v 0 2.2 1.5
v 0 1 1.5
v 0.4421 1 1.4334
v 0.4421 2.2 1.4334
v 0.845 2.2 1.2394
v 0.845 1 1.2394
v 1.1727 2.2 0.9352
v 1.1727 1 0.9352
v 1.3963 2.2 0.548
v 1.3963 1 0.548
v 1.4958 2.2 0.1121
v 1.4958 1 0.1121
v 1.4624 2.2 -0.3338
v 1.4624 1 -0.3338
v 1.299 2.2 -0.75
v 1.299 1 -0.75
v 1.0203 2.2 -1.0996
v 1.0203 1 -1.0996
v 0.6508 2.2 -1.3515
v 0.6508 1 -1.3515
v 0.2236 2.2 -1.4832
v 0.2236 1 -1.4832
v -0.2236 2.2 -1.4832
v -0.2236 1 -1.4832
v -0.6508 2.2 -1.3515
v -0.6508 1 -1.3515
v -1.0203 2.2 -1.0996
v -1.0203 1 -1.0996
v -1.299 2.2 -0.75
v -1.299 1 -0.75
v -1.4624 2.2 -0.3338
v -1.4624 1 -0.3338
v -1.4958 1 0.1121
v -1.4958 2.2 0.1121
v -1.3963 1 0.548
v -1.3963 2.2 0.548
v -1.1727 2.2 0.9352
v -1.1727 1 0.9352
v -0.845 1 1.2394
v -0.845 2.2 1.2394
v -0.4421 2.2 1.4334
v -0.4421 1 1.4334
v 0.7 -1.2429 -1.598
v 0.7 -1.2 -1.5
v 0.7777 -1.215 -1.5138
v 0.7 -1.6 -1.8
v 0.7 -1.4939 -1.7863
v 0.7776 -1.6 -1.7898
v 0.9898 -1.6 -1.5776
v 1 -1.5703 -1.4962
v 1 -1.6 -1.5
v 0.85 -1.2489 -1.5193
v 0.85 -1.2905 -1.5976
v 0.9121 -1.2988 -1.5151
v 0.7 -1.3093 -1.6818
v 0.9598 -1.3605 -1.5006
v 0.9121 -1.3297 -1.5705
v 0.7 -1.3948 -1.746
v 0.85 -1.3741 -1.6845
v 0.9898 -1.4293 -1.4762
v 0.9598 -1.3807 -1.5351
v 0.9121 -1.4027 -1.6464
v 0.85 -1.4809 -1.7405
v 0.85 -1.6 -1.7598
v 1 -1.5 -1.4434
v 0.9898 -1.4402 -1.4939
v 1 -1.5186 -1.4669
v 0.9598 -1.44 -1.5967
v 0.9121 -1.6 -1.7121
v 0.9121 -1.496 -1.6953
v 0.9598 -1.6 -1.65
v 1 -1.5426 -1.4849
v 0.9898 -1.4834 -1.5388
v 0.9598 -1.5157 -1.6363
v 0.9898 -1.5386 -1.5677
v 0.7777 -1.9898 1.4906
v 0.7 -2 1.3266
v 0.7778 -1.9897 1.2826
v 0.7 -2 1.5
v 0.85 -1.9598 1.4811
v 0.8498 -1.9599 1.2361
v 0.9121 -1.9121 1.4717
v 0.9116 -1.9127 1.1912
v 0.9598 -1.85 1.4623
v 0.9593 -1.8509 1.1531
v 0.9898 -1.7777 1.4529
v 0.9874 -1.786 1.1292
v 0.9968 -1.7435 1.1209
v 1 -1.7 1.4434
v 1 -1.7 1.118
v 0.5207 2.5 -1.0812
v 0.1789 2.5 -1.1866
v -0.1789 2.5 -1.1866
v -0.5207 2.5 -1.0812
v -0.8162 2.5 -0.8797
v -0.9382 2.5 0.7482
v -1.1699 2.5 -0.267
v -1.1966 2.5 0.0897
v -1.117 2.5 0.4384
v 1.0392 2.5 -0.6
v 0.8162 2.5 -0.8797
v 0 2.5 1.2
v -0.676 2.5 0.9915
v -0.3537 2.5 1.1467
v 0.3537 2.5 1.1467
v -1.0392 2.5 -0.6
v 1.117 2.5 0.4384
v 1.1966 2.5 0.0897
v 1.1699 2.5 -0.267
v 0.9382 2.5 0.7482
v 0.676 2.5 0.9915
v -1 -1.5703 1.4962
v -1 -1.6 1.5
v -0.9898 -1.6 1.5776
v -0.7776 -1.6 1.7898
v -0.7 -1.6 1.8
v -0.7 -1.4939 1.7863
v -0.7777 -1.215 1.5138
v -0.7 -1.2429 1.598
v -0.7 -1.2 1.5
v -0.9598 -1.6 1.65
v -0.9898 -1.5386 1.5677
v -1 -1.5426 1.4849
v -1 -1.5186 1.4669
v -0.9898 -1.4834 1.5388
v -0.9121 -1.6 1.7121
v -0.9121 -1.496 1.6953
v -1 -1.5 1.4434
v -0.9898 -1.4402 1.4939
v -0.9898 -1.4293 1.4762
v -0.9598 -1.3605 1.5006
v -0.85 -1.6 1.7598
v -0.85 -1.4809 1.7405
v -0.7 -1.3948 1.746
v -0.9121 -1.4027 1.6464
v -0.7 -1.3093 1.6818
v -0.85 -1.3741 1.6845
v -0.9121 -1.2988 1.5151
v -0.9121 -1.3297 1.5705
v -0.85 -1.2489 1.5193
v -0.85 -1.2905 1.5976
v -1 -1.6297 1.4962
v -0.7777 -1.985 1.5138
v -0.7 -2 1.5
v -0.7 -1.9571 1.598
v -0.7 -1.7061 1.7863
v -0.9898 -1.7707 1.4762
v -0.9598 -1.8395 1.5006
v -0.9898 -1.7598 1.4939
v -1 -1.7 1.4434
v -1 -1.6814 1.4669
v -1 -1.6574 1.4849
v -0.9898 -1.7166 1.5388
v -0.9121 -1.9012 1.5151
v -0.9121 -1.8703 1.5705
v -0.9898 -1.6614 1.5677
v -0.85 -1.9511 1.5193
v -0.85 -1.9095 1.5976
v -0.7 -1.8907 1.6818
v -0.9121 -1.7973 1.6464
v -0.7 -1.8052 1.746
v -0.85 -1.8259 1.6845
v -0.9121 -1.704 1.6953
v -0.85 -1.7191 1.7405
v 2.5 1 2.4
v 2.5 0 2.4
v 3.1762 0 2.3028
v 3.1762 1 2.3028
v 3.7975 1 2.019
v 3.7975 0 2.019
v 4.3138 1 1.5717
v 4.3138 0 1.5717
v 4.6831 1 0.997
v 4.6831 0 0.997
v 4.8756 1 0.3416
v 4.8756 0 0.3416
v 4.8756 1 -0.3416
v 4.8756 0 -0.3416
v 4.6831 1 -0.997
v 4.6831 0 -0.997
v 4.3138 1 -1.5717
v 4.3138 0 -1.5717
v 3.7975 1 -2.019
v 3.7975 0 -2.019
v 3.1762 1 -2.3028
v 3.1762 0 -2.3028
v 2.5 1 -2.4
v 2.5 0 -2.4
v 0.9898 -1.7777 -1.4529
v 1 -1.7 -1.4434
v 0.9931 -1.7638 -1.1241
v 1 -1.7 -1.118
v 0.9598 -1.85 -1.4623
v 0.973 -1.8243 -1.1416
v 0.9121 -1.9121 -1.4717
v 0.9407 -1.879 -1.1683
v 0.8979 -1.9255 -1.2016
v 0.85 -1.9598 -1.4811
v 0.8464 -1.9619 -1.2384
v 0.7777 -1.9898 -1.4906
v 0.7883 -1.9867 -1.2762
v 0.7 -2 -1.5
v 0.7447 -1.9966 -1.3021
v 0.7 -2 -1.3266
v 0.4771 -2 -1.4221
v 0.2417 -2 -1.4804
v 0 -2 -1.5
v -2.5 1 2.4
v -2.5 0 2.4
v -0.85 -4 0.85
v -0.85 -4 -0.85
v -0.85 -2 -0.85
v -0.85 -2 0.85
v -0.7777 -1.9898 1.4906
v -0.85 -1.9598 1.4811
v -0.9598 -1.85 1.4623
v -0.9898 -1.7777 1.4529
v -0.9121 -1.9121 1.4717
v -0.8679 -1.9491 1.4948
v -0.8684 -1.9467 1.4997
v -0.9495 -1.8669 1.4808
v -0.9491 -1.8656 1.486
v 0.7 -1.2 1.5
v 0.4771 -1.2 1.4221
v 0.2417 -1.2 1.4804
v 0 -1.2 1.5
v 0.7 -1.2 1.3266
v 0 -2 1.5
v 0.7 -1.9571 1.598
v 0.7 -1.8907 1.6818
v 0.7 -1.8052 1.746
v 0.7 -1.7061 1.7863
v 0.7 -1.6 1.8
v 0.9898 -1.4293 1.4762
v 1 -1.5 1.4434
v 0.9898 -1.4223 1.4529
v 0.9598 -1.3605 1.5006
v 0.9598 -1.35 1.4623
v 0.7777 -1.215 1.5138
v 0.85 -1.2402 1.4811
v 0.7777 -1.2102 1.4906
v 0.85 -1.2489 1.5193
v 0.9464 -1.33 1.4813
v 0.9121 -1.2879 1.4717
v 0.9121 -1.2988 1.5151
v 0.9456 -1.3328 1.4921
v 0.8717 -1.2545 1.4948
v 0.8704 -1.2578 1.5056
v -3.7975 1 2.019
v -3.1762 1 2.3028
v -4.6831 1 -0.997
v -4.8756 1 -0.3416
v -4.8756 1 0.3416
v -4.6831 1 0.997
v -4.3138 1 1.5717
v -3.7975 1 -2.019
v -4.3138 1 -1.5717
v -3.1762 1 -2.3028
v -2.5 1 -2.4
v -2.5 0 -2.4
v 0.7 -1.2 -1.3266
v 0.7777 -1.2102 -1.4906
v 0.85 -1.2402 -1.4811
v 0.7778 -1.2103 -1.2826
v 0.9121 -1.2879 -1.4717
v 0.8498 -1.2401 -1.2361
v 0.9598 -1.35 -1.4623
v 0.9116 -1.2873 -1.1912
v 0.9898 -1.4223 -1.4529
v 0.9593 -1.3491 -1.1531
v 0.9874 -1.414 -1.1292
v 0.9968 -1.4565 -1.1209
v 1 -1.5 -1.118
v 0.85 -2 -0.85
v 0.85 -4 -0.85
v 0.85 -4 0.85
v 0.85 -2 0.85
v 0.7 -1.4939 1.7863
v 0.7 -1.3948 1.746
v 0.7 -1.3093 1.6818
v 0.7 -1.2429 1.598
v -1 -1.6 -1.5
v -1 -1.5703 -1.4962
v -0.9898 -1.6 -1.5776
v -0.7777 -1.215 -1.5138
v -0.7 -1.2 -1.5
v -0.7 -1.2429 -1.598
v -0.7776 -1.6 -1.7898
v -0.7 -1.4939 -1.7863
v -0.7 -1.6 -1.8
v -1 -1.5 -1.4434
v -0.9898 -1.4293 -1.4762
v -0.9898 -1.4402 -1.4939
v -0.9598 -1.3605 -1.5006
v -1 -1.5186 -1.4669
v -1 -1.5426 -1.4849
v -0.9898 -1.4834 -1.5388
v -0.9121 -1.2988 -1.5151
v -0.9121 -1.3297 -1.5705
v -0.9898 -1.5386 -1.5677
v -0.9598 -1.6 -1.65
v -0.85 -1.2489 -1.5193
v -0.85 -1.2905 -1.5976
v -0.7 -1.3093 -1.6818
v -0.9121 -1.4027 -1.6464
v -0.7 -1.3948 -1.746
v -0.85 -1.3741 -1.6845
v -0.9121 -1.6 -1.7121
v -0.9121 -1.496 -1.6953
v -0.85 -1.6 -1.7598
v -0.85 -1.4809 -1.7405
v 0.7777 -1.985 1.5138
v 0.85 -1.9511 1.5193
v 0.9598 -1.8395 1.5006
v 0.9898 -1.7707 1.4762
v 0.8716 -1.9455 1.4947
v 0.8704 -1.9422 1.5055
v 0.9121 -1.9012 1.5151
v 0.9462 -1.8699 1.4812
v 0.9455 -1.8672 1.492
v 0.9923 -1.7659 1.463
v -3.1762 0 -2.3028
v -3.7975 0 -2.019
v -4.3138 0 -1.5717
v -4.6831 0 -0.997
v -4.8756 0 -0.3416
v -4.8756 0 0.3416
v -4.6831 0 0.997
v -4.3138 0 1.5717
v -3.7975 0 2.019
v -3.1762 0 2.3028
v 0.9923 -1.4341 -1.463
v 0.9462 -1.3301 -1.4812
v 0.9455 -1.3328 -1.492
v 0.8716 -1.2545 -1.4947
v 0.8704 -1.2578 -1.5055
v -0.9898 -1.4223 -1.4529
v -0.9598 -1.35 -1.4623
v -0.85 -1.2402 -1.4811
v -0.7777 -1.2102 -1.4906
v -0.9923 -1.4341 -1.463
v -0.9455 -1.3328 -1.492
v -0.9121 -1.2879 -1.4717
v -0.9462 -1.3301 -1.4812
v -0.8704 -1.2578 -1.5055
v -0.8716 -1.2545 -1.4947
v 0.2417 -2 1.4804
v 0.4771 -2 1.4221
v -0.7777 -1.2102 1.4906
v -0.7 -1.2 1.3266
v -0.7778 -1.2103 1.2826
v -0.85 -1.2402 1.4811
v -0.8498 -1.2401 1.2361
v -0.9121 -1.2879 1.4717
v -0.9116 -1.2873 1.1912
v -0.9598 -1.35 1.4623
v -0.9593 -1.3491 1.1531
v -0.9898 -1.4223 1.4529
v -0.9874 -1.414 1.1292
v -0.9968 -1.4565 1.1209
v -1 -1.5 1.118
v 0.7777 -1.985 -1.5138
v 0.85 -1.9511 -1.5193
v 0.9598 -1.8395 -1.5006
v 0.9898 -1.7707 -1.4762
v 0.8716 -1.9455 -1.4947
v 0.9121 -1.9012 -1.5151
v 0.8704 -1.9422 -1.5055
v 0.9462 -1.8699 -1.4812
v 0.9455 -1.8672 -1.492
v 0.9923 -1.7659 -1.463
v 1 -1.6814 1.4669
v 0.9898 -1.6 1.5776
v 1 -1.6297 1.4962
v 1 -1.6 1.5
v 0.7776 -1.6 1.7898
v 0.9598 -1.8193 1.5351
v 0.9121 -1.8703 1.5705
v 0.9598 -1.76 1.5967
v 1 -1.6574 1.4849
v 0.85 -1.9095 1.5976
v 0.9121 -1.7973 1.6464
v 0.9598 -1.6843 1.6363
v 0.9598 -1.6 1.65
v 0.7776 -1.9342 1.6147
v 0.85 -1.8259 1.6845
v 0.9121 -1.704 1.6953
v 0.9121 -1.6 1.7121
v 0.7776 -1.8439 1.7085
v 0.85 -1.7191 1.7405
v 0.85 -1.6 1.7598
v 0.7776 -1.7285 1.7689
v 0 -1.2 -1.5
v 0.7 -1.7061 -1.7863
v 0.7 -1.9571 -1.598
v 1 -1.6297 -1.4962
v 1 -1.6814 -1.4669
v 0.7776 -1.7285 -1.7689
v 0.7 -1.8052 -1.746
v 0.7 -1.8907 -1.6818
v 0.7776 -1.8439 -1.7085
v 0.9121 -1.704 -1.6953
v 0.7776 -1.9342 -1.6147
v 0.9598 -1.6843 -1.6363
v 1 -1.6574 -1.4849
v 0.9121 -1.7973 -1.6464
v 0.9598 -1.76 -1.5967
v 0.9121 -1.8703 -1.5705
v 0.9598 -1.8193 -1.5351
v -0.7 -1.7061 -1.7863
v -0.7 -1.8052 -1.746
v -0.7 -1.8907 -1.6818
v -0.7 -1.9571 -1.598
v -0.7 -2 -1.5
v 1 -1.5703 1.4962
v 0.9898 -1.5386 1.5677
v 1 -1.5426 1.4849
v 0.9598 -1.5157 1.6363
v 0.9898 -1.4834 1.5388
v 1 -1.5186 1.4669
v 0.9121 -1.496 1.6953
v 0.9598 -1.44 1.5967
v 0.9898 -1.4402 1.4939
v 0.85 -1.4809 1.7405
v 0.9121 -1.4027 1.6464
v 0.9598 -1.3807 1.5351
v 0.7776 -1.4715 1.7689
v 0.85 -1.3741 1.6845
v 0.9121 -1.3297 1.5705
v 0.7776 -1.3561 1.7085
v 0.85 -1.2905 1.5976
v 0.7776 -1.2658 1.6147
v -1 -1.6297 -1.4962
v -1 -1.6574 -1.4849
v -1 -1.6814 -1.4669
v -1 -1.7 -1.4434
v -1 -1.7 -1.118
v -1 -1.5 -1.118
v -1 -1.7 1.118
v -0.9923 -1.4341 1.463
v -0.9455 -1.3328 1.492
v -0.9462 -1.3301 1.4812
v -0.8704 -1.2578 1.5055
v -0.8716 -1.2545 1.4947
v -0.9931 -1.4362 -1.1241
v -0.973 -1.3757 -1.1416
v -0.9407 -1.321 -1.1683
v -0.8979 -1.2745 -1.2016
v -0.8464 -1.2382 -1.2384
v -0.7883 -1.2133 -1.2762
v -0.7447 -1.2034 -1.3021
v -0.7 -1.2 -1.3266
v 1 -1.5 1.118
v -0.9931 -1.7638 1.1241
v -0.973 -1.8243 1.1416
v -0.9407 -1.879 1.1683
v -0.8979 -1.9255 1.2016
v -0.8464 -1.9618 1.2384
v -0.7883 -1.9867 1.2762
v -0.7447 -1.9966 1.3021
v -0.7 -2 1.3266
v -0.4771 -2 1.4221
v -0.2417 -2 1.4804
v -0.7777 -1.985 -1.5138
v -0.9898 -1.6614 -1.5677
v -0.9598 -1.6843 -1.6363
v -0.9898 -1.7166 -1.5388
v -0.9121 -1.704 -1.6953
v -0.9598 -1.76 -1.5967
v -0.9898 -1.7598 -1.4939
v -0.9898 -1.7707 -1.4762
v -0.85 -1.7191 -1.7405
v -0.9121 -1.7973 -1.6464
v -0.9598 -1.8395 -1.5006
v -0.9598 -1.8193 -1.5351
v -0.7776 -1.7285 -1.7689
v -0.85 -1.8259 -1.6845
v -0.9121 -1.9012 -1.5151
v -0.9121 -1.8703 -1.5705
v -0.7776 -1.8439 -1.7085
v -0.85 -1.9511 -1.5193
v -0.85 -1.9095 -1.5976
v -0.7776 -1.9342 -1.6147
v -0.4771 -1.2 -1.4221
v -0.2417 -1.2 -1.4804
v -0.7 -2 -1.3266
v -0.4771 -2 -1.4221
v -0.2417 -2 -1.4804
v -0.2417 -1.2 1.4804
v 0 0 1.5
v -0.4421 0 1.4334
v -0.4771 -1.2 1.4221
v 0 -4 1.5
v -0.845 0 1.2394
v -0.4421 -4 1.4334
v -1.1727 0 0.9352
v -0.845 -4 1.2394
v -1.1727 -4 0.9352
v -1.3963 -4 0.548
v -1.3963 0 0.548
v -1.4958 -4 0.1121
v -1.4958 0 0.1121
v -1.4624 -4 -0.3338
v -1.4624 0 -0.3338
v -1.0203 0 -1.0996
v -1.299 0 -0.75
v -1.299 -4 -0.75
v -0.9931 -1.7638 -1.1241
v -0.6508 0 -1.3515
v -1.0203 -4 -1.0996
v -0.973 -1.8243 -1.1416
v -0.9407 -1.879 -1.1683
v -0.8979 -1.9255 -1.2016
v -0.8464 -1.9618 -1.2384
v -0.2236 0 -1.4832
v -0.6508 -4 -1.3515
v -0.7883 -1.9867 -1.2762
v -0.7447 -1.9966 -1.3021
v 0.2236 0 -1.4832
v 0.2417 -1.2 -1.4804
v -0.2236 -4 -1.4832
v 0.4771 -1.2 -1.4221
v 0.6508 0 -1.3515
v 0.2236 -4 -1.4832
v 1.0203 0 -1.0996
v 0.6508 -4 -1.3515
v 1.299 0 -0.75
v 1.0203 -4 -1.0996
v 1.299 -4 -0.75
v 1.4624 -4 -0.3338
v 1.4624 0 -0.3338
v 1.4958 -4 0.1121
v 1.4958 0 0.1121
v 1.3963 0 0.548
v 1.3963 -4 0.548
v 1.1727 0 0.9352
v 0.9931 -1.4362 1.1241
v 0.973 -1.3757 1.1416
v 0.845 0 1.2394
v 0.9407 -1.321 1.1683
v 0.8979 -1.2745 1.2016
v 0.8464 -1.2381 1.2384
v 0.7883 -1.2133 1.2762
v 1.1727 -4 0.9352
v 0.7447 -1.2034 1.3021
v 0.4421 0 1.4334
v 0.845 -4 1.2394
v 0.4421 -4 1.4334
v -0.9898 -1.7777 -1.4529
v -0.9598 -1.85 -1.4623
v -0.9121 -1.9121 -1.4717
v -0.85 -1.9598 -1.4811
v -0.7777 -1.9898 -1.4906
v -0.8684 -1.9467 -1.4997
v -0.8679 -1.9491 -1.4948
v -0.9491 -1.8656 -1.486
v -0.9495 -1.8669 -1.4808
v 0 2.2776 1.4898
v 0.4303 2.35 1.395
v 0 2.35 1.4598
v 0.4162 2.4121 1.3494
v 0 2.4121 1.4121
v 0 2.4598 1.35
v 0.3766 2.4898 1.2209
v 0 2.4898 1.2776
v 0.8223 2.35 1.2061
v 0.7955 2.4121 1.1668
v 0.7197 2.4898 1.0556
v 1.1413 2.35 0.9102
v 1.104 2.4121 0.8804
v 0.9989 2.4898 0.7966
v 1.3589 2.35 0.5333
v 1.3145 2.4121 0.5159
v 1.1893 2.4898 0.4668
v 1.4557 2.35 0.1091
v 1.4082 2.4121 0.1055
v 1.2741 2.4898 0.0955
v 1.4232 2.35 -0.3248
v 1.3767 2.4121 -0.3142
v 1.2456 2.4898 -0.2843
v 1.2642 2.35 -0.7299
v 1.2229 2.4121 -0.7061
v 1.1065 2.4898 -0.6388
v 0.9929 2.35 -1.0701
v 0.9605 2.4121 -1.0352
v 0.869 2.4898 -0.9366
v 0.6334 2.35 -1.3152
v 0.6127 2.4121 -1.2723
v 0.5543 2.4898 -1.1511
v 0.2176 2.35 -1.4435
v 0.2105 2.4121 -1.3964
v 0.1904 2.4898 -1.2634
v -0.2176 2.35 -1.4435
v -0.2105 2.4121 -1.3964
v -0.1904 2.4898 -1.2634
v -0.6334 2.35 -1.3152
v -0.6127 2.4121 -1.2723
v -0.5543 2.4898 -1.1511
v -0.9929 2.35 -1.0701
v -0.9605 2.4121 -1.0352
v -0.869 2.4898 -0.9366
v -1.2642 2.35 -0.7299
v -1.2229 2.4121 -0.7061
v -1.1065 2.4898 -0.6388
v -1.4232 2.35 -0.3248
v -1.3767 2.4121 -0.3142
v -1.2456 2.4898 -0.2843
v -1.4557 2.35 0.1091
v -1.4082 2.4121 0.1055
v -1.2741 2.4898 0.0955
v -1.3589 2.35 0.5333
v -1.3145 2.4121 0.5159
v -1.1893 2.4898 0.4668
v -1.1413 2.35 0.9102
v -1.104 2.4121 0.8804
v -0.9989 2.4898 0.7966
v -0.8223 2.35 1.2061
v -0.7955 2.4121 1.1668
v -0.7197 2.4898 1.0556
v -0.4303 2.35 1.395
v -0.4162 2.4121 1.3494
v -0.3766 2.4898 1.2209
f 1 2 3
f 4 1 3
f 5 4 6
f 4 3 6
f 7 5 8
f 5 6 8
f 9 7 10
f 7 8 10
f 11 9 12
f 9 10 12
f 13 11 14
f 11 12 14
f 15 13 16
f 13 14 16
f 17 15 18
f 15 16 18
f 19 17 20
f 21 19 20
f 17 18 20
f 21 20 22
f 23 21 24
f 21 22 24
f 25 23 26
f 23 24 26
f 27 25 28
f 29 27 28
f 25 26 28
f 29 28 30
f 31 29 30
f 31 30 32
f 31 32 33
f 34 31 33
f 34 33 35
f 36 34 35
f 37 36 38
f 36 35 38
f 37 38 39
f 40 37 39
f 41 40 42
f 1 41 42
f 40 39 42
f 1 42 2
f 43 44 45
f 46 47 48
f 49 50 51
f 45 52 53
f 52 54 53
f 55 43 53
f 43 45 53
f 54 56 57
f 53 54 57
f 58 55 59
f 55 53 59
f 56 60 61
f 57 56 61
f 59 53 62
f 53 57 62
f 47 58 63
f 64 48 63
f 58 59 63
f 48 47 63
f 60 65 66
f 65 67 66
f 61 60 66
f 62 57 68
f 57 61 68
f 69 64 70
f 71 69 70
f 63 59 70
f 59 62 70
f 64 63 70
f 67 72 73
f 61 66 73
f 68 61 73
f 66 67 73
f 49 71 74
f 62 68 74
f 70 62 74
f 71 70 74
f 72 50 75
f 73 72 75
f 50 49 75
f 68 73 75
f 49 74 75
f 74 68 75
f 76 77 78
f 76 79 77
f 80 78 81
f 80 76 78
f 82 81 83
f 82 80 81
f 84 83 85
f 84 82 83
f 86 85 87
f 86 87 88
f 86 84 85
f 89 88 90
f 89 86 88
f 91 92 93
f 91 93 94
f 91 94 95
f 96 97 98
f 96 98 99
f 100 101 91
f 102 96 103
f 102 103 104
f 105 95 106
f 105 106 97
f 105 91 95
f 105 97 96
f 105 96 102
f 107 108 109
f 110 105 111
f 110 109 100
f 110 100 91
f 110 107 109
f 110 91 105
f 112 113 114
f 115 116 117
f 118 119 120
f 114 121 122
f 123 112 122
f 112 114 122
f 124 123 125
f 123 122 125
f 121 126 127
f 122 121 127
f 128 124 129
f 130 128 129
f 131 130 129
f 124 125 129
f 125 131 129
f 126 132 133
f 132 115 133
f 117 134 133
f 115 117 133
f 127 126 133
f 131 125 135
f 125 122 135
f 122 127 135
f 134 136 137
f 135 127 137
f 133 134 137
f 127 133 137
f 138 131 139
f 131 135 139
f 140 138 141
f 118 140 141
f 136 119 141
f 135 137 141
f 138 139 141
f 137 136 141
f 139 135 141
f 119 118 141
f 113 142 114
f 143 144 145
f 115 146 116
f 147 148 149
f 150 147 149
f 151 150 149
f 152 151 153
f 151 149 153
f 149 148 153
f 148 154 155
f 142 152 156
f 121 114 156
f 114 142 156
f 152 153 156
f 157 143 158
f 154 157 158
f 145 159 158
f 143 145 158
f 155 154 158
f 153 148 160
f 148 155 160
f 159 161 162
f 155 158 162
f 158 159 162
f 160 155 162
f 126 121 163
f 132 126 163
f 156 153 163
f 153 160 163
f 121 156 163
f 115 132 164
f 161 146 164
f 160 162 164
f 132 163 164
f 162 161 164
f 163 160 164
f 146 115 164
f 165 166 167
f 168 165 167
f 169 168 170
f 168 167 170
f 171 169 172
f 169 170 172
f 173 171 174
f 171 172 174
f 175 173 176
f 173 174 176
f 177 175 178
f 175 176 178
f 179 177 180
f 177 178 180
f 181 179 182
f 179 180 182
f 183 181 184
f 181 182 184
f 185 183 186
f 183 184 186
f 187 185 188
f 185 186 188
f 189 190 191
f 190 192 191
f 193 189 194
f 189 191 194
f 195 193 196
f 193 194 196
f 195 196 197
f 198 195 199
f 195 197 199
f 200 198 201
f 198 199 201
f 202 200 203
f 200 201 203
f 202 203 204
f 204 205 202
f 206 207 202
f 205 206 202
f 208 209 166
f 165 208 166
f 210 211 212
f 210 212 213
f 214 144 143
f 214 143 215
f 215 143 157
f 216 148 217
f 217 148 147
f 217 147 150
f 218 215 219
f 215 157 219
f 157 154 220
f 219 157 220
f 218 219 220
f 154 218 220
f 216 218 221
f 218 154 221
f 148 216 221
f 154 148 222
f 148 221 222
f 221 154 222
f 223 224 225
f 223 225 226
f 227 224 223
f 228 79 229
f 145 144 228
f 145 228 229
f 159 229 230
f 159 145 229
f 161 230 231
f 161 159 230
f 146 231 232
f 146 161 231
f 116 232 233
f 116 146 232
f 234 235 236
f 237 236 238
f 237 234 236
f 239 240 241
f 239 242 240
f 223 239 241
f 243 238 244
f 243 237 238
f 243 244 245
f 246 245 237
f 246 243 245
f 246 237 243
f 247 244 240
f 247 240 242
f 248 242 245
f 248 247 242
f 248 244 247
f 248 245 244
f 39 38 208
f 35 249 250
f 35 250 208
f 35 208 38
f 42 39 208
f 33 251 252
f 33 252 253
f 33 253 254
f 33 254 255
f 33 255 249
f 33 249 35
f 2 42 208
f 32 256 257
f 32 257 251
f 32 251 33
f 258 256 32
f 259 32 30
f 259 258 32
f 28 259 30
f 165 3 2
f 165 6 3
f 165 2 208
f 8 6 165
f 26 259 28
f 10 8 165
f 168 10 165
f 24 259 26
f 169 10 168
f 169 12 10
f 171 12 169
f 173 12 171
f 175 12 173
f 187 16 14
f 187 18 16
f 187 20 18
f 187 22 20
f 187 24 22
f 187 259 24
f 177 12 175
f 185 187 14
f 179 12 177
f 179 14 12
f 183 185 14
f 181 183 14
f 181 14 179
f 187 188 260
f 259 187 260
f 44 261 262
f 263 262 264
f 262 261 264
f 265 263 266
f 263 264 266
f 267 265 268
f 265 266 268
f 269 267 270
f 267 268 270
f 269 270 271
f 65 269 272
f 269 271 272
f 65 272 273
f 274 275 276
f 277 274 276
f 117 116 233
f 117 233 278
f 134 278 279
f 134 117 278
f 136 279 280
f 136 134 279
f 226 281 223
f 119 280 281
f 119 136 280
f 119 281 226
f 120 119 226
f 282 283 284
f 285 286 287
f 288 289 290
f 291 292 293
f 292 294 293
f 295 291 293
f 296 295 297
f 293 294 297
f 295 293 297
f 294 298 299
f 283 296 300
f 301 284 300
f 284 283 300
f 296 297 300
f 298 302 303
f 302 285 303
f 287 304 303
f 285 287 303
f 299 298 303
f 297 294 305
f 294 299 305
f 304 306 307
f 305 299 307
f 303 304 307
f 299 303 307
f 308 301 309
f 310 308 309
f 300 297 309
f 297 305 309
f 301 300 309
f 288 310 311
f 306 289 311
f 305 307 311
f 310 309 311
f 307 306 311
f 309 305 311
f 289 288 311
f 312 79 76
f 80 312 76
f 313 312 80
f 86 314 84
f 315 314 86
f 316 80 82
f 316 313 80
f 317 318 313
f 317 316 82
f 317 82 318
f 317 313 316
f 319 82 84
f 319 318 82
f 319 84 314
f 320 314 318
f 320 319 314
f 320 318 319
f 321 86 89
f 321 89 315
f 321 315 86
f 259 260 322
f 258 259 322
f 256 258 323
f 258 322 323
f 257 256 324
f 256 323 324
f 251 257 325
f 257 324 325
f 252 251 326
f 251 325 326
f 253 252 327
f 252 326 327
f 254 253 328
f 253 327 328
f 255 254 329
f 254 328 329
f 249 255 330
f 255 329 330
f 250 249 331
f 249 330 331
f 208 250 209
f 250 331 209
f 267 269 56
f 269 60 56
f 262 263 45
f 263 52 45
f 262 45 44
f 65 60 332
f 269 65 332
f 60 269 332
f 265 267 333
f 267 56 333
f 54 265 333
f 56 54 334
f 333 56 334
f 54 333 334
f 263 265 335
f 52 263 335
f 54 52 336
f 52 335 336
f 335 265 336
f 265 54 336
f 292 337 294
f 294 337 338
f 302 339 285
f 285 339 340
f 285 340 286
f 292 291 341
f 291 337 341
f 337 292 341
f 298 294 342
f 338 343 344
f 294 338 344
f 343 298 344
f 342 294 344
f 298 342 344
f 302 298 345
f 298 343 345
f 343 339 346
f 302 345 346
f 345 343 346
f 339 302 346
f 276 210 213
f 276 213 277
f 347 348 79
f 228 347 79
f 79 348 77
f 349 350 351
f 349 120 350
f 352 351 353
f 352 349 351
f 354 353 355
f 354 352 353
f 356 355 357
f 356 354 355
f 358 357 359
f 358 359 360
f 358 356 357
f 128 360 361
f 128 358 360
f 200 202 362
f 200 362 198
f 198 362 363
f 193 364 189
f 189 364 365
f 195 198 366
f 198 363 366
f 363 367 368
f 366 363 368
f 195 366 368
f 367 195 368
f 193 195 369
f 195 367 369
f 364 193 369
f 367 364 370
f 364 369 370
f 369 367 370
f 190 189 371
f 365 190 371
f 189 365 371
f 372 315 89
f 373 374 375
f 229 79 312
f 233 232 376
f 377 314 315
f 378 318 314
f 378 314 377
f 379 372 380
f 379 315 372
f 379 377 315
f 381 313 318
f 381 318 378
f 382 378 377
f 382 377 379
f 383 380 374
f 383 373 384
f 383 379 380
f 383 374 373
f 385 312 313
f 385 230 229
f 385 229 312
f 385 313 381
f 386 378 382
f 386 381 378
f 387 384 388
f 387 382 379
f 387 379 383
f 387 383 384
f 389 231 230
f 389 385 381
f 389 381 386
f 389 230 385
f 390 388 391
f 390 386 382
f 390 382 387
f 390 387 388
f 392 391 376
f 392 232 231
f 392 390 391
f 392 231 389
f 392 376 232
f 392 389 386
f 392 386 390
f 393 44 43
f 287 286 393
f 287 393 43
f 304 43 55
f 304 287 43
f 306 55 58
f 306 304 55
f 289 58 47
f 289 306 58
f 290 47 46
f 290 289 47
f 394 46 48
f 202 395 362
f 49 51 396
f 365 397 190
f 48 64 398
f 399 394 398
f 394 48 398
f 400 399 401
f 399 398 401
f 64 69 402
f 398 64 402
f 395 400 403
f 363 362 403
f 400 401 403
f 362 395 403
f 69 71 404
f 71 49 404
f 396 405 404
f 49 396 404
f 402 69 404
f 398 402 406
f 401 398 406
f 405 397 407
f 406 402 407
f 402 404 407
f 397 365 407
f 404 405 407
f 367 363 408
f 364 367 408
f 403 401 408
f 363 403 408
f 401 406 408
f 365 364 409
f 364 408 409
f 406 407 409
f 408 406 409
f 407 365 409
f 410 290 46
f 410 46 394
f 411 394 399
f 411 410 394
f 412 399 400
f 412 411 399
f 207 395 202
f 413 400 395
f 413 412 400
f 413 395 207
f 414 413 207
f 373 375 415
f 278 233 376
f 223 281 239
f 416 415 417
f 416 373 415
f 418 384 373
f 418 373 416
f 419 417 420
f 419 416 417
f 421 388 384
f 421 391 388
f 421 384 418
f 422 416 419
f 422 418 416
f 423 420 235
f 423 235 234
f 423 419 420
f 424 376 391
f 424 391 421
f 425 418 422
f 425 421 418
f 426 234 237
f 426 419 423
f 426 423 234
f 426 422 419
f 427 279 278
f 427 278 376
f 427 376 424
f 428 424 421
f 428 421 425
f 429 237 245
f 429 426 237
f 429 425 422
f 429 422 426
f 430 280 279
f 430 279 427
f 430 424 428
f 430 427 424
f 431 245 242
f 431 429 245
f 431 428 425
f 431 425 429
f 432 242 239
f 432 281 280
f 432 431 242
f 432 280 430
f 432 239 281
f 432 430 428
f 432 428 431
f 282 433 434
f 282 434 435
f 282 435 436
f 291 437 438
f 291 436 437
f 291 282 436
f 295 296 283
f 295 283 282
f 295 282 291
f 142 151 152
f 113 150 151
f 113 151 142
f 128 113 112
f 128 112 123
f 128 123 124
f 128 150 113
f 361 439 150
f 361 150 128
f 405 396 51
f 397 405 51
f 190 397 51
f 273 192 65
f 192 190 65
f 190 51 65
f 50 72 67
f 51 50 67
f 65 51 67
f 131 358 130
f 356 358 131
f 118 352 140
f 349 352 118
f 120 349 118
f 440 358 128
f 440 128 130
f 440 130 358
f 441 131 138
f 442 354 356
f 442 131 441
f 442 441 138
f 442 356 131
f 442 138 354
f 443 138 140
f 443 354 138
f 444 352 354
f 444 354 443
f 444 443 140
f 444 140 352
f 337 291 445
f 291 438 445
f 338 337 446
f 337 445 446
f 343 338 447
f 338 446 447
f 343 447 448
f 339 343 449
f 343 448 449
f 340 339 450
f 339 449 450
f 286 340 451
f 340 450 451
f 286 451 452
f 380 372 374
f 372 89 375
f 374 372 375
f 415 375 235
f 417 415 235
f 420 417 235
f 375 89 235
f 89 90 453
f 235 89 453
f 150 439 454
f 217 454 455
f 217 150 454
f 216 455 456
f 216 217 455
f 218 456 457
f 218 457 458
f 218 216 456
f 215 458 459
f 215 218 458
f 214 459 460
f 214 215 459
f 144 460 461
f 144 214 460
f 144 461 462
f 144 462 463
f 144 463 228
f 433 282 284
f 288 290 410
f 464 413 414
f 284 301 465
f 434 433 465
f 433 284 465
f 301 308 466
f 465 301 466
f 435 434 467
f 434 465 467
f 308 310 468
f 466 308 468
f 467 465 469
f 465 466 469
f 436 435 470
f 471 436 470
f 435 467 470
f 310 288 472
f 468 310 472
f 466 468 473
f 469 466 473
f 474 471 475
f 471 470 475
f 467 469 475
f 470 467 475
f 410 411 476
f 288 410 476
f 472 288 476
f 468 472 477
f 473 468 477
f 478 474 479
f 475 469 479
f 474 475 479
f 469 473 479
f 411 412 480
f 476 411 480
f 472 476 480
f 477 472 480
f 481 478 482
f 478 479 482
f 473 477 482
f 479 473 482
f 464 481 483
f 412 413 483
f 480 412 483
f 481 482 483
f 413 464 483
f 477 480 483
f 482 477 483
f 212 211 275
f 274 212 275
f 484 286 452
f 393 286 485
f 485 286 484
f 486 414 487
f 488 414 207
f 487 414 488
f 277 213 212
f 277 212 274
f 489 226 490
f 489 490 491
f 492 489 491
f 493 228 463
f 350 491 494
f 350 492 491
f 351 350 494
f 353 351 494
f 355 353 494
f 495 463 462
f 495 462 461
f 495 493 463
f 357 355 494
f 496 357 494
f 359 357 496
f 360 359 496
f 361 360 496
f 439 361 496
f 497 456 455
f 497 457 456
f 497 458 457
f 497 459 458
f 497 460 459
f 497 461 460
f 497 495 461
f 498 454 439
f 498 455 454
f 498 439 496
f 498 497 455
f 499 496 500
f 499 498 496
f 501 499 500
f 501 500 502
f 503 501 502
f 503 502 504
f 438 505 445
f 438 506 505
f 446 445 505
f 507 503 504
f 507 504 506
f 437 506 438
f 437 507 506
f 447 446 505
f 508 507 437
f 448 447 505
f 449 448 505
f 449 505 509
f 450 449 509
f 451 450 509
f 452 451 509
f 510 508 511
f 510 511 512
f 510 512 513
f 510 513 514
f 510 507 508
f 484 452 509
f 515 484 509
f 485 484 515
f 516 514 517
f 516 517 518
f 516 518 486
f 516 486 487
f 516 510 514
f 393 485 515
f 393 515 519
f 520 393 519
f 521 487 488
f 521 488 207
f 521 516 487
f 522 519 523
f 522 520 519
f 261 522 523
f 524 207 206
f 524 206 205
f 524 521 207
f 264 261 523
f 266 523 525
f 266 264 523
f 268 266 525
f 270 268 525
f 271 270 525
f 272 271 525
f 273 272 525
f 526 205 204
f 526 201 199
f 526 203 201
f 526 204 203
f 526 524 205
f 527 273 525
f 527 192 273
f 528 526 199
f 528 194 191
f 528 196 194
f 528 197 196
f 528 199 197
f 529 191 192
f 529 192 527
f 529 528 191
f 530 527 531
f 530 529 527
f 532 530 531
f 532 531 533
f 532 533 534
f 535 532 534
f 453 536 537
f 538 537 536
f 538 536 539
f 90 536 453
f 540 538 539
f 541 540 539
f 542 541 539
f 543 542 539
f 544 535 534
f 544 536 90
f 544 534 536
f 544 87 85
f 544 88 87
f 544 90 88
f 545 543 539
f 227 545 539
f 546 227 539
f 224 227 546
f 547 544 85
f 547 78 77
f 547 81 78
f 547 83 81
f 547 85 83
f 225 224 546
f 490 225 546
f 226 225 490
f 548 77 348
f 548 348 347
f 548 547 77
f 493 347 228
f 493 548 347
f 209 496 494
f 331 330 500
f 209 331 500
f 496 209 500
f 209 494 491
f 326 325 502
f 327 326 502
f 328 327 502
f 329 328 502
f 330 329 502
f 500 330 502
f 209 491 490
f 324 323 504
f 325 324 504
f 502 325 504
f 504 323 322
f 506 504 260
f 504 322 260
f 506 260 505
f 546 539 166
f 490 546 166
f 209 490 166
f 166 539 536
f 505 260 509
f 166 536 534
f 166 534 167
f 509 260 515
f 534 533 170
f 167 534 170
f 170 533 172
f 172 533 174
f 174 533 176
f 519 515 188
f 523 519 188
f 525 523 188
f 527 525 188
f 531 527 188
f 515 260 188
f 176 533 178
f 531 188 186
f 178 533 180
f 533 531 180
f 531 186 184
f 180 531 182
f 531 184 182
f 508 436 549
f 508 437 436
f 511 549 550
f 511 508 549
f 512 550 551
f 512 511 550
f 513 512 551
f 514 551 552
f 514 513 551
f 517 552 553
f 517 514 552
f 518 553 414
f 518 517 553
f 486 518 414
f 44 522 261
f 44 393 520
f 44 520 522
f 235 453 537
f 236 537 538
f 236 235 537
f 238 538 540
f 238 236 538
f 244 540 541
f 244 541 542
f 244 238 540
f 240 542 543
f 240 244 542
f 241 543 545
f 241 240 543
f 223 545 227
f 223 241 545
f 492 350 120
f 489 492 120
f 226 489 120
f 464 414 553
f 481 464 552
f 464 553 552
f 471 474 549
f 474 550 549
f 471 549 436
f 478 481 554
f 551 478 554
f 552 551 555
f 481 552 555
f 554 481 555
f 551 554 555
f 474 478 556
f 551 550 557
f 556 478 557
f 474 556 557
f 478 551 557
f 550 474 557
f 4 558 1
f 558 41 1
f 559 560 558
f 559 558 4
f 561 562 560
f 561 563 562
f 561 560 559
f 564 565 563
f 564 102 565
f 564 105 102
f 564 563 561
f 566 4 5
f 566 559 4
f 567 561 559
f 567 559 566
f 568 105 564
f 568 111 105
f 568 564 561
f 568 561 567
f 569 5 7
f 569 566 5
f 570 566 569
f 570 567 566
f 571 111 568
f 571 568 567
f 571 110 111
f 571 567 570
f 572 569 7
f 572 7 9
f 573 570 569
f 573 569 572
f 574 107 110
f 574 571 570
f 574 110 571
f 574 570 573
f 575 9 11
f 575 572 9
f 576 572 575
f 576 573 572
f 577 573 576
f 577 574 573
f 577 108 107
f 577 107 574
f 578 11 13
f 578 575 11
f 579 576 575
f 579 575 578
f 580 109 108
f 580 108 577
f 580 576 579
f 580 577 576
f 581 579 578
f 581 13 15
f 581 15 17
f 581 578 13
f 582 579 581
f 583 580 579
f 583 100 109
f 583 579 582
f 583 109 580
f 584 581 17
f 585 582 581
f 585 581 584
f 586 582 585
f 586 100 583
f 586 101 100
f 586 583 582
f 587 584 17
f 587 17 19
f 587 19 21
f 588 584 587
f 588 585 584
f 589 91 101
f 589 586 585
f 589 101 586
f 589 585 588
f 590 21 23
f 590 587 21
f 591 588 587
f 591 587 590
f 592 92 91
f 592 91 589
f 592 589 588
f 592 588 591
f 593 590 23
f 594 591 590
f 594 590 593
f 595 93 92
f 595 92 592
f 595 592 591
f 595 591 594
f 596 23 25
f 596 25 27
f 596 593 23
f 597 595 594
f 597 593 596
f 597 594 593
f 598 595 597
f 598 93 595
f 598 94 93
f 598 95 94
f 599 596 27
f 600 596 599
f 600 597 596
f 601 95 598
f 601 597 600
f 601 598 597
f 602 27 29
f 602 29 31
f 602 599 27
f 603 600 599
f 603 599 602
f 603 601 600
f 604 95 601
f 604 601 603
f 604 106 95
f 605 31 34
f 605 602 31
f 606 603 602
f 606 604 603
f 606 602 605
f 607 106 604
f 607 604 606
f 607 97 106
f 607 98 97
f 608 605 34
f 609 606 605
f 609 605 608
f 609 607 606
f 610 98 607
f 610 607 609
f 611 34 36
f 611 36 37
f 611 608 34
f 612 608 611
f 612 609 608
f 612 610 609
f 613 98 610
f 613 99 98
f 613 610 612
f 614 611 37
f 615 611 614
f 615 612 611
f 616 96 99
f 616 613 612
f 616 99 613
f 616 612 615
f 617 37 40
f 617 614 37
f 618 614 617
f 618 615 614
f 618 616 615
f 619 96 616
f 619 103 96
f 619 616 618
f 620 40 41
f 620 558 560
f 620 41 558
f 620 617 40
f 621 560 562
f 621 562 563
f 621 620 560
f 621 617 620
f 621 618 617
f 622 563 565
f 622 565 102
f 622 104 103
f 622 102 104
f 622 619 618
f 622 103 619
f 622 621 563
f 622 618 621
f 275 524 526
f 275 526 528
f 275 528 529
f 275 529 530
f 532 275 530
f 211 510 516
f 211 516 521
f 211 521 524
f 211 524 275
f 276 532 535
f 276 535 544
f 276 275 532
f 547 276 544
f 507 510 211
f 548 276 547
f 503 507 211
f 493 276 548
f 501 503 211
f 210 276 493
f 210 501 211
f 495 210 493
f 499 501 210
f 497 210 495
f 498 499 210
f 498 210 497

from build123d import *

# Parameters (mm, degrees)
EXTRUDE_1294_DEPTH   = 1
SKETCH_1344_R        = 1.5
EXTRUDE_1_DEPTH      = 1.5
EXTRUDE_START        = 4
SKETCH_1505_R        = 1.5
EXTRUDE_2_DEPTH      = 4
EXTRUDE_3_DEPTH      = 1.8
EXTRUDE_3_DEPTH_BACK = 1.8
CUT_EXTRUDE_1_DEPTH  = 2
SKETCH_6_W           = 1.7
SKETCH_6_H           = 1.7
CUT_EXTRUDE_2_DEPTH  = 2
FILLET_1_R           = 0.3


with BuildPart() as part:
    # Sketch 213 → Extrude 1294 (new body)
    with BuildSketch(Plane(origin=(0, 0, 0), x_dir=(1, 0, 0), z_dir=(0, 1, 0))):
        with BuildLine():
            Line((-2.4999999999999996, -2.4), (2.5000000000000004, -2.4))
            ThreePointArc((2.5000000000000004, -2.4), (4.9, 0), (2.5000000000000004, 2.4))
            Line((2.5000000000000004, 2.4), (-2.4999999999999996, 2.4))
            ThreePointArc((-2.4999999999999996, 2.4), (-4.8999999999999995, 2.9e-16), (-2.4999999999999996, -2.4))
        make_face()
    extrude(amount=EXTRUDE_1294_DEPTH)

    # Sketch 1344 → 凸台-拉伸1 (add)
    with BuildSketch(Plane(origin=(0, 1, 0), x_dir=(1, 0, 0), z_dir=(0, 1, 0))):
        Circle(SKETCH_1344_R)
    extrude(amount=EXTRUDE_1_DEPTH)

    # Sketch 1505 → 凸台-拉伸2 (add)
    with BuildSketch(Plane.XZ.offset(EXTRUDE_START)):
        Circle(SKETCH_1505_R)
    extrude(amount=-EXTRUDE_2_DEPTH)

    # Sketch 1641 → 凸台-拉伸3 (add, two sides: drawn at the far end of the back side and taken through both)
    with BuildSketch(Plane.XY.offset(-EXTRUDE_3_DEPTH_BACK)):
        Polygon((-1.0000000000000002, -2), (0.9999999999999998, -2), (0.9999999999999996, -1.2000000000000002), (-1.0000000000000004, -1.2000000000000002), align=None)
    extrude(amount=EXTRUDE_3_DEPTH + EXTRUDE_3_DEPTH_BACK)

    # 草图4 → 切除-拉伸1 (cut)
    with BuildSketch(Plane(origin=(0.9999999999999991, 2.7e-16, 0), x_dir=(0, 0, -1), z_dir=(1, 2.7e-16, 0))):
        with BuildLine():
            Line((1.8, -2), (1.8, -1.5999999999999996))
            ThreePointArc((1.7999999999999998, -1.5999999999999996), (1.7166666666666668, -1.8499999999999996), (1.5000000000000004, -2))
            Line((1.5000000000000002, -2), (1.8, -2))
        make_face()
        with BuildLine():
            Line((1.8, -1.2000000000000004), (1.5000000000000002, -1.2000000000000002))
            ThreePointArc((1.5000000000000002, -1.2000000000000002), (1.7166666666666663, -1.35), (1.7999999999999998, -1.5999999999999996))
            Line((1.8, -1.5999999999999996), (1.8, -1.2000000000000004))
        make_face()
        with BuildLine():
            Line((-1.5000000000000002, -1.2000000000000002), (-1.8, -1.2000000000000004))
            Line((-1.8, -1.2000000000000004), (-1.8, -1.6000000000000005))
            ThreePointArc((-1.7999999999999998, -1.6000000000000005), (-1.7166666666666668, -1.3500000000000005), (-1.5000000000000004, -1.2000000000000002))
        make_face()
        with BuildLine():
            ThreePointArc((-1.5000000000000002, -2), (-1.7166666666666663, -1.85), (-1.7999999999999998, -1.6000000000000005))
            Line((-1.8, -1.6000000000000005), (-1.8, -2))
            Line((-1.8, -2), (-1.5000000000000002, -2))
        make_face()
    extrude(amount=-CUT_EXTRUDE_1_DEPTH, mode=Mode.SUBTRACT)

    # 草图6 → 切除-拉伸2 (cut)
    with BuildSketch(Plane.XZ.offset(4)):
        Rectangle(SKETCH_6_W, SKETCH_6_H)
    extrude(amount=-CUT_EXTRUDE_2_DEPTH, mode=Mode.SUBTRACT)

    # 圆角1
    fillet_1_edges = [part.edges().sort_by_distance(p)[0] for p in [
        (-1.5, 2.5, -1.8e-16),
        (-1.0000000000000004, -1.2000000000000002, 1.3090169943749475),
        (-1.0000000000000004, -1.6, 1.7999999999999998),
        (-1.0000000000000002, -2, 1.3090169943749475),
        (0.9999999999999998, -2, 1.3090169943749477),
        (0.9999999999999996, -1.6000000000000003, 1.7999999999999998),
        (0.9999999999999996, -1.2000000000000002, 1.3090169943749481),
        (-1.0000000000000004, -1.2000000000000002, -1.3090169943749472),
        (-1.0000000000000004, -1.6000000000000005, -1.7999999999999998),
        (-1.0000000000000002, -2, -1.3090169943749477),
        (0.9999999999999996, -1.2000000000000002, -1.309016994374948),
        (0.9999999999999998, -2, -1.3090169943749477),
        (0.9999999999999996, -1.5999999999999994, -1.7999999999999998),
    ]]
    fillet(fillet_1_edges, radius=FILLET_1_R)


solid = part.part
